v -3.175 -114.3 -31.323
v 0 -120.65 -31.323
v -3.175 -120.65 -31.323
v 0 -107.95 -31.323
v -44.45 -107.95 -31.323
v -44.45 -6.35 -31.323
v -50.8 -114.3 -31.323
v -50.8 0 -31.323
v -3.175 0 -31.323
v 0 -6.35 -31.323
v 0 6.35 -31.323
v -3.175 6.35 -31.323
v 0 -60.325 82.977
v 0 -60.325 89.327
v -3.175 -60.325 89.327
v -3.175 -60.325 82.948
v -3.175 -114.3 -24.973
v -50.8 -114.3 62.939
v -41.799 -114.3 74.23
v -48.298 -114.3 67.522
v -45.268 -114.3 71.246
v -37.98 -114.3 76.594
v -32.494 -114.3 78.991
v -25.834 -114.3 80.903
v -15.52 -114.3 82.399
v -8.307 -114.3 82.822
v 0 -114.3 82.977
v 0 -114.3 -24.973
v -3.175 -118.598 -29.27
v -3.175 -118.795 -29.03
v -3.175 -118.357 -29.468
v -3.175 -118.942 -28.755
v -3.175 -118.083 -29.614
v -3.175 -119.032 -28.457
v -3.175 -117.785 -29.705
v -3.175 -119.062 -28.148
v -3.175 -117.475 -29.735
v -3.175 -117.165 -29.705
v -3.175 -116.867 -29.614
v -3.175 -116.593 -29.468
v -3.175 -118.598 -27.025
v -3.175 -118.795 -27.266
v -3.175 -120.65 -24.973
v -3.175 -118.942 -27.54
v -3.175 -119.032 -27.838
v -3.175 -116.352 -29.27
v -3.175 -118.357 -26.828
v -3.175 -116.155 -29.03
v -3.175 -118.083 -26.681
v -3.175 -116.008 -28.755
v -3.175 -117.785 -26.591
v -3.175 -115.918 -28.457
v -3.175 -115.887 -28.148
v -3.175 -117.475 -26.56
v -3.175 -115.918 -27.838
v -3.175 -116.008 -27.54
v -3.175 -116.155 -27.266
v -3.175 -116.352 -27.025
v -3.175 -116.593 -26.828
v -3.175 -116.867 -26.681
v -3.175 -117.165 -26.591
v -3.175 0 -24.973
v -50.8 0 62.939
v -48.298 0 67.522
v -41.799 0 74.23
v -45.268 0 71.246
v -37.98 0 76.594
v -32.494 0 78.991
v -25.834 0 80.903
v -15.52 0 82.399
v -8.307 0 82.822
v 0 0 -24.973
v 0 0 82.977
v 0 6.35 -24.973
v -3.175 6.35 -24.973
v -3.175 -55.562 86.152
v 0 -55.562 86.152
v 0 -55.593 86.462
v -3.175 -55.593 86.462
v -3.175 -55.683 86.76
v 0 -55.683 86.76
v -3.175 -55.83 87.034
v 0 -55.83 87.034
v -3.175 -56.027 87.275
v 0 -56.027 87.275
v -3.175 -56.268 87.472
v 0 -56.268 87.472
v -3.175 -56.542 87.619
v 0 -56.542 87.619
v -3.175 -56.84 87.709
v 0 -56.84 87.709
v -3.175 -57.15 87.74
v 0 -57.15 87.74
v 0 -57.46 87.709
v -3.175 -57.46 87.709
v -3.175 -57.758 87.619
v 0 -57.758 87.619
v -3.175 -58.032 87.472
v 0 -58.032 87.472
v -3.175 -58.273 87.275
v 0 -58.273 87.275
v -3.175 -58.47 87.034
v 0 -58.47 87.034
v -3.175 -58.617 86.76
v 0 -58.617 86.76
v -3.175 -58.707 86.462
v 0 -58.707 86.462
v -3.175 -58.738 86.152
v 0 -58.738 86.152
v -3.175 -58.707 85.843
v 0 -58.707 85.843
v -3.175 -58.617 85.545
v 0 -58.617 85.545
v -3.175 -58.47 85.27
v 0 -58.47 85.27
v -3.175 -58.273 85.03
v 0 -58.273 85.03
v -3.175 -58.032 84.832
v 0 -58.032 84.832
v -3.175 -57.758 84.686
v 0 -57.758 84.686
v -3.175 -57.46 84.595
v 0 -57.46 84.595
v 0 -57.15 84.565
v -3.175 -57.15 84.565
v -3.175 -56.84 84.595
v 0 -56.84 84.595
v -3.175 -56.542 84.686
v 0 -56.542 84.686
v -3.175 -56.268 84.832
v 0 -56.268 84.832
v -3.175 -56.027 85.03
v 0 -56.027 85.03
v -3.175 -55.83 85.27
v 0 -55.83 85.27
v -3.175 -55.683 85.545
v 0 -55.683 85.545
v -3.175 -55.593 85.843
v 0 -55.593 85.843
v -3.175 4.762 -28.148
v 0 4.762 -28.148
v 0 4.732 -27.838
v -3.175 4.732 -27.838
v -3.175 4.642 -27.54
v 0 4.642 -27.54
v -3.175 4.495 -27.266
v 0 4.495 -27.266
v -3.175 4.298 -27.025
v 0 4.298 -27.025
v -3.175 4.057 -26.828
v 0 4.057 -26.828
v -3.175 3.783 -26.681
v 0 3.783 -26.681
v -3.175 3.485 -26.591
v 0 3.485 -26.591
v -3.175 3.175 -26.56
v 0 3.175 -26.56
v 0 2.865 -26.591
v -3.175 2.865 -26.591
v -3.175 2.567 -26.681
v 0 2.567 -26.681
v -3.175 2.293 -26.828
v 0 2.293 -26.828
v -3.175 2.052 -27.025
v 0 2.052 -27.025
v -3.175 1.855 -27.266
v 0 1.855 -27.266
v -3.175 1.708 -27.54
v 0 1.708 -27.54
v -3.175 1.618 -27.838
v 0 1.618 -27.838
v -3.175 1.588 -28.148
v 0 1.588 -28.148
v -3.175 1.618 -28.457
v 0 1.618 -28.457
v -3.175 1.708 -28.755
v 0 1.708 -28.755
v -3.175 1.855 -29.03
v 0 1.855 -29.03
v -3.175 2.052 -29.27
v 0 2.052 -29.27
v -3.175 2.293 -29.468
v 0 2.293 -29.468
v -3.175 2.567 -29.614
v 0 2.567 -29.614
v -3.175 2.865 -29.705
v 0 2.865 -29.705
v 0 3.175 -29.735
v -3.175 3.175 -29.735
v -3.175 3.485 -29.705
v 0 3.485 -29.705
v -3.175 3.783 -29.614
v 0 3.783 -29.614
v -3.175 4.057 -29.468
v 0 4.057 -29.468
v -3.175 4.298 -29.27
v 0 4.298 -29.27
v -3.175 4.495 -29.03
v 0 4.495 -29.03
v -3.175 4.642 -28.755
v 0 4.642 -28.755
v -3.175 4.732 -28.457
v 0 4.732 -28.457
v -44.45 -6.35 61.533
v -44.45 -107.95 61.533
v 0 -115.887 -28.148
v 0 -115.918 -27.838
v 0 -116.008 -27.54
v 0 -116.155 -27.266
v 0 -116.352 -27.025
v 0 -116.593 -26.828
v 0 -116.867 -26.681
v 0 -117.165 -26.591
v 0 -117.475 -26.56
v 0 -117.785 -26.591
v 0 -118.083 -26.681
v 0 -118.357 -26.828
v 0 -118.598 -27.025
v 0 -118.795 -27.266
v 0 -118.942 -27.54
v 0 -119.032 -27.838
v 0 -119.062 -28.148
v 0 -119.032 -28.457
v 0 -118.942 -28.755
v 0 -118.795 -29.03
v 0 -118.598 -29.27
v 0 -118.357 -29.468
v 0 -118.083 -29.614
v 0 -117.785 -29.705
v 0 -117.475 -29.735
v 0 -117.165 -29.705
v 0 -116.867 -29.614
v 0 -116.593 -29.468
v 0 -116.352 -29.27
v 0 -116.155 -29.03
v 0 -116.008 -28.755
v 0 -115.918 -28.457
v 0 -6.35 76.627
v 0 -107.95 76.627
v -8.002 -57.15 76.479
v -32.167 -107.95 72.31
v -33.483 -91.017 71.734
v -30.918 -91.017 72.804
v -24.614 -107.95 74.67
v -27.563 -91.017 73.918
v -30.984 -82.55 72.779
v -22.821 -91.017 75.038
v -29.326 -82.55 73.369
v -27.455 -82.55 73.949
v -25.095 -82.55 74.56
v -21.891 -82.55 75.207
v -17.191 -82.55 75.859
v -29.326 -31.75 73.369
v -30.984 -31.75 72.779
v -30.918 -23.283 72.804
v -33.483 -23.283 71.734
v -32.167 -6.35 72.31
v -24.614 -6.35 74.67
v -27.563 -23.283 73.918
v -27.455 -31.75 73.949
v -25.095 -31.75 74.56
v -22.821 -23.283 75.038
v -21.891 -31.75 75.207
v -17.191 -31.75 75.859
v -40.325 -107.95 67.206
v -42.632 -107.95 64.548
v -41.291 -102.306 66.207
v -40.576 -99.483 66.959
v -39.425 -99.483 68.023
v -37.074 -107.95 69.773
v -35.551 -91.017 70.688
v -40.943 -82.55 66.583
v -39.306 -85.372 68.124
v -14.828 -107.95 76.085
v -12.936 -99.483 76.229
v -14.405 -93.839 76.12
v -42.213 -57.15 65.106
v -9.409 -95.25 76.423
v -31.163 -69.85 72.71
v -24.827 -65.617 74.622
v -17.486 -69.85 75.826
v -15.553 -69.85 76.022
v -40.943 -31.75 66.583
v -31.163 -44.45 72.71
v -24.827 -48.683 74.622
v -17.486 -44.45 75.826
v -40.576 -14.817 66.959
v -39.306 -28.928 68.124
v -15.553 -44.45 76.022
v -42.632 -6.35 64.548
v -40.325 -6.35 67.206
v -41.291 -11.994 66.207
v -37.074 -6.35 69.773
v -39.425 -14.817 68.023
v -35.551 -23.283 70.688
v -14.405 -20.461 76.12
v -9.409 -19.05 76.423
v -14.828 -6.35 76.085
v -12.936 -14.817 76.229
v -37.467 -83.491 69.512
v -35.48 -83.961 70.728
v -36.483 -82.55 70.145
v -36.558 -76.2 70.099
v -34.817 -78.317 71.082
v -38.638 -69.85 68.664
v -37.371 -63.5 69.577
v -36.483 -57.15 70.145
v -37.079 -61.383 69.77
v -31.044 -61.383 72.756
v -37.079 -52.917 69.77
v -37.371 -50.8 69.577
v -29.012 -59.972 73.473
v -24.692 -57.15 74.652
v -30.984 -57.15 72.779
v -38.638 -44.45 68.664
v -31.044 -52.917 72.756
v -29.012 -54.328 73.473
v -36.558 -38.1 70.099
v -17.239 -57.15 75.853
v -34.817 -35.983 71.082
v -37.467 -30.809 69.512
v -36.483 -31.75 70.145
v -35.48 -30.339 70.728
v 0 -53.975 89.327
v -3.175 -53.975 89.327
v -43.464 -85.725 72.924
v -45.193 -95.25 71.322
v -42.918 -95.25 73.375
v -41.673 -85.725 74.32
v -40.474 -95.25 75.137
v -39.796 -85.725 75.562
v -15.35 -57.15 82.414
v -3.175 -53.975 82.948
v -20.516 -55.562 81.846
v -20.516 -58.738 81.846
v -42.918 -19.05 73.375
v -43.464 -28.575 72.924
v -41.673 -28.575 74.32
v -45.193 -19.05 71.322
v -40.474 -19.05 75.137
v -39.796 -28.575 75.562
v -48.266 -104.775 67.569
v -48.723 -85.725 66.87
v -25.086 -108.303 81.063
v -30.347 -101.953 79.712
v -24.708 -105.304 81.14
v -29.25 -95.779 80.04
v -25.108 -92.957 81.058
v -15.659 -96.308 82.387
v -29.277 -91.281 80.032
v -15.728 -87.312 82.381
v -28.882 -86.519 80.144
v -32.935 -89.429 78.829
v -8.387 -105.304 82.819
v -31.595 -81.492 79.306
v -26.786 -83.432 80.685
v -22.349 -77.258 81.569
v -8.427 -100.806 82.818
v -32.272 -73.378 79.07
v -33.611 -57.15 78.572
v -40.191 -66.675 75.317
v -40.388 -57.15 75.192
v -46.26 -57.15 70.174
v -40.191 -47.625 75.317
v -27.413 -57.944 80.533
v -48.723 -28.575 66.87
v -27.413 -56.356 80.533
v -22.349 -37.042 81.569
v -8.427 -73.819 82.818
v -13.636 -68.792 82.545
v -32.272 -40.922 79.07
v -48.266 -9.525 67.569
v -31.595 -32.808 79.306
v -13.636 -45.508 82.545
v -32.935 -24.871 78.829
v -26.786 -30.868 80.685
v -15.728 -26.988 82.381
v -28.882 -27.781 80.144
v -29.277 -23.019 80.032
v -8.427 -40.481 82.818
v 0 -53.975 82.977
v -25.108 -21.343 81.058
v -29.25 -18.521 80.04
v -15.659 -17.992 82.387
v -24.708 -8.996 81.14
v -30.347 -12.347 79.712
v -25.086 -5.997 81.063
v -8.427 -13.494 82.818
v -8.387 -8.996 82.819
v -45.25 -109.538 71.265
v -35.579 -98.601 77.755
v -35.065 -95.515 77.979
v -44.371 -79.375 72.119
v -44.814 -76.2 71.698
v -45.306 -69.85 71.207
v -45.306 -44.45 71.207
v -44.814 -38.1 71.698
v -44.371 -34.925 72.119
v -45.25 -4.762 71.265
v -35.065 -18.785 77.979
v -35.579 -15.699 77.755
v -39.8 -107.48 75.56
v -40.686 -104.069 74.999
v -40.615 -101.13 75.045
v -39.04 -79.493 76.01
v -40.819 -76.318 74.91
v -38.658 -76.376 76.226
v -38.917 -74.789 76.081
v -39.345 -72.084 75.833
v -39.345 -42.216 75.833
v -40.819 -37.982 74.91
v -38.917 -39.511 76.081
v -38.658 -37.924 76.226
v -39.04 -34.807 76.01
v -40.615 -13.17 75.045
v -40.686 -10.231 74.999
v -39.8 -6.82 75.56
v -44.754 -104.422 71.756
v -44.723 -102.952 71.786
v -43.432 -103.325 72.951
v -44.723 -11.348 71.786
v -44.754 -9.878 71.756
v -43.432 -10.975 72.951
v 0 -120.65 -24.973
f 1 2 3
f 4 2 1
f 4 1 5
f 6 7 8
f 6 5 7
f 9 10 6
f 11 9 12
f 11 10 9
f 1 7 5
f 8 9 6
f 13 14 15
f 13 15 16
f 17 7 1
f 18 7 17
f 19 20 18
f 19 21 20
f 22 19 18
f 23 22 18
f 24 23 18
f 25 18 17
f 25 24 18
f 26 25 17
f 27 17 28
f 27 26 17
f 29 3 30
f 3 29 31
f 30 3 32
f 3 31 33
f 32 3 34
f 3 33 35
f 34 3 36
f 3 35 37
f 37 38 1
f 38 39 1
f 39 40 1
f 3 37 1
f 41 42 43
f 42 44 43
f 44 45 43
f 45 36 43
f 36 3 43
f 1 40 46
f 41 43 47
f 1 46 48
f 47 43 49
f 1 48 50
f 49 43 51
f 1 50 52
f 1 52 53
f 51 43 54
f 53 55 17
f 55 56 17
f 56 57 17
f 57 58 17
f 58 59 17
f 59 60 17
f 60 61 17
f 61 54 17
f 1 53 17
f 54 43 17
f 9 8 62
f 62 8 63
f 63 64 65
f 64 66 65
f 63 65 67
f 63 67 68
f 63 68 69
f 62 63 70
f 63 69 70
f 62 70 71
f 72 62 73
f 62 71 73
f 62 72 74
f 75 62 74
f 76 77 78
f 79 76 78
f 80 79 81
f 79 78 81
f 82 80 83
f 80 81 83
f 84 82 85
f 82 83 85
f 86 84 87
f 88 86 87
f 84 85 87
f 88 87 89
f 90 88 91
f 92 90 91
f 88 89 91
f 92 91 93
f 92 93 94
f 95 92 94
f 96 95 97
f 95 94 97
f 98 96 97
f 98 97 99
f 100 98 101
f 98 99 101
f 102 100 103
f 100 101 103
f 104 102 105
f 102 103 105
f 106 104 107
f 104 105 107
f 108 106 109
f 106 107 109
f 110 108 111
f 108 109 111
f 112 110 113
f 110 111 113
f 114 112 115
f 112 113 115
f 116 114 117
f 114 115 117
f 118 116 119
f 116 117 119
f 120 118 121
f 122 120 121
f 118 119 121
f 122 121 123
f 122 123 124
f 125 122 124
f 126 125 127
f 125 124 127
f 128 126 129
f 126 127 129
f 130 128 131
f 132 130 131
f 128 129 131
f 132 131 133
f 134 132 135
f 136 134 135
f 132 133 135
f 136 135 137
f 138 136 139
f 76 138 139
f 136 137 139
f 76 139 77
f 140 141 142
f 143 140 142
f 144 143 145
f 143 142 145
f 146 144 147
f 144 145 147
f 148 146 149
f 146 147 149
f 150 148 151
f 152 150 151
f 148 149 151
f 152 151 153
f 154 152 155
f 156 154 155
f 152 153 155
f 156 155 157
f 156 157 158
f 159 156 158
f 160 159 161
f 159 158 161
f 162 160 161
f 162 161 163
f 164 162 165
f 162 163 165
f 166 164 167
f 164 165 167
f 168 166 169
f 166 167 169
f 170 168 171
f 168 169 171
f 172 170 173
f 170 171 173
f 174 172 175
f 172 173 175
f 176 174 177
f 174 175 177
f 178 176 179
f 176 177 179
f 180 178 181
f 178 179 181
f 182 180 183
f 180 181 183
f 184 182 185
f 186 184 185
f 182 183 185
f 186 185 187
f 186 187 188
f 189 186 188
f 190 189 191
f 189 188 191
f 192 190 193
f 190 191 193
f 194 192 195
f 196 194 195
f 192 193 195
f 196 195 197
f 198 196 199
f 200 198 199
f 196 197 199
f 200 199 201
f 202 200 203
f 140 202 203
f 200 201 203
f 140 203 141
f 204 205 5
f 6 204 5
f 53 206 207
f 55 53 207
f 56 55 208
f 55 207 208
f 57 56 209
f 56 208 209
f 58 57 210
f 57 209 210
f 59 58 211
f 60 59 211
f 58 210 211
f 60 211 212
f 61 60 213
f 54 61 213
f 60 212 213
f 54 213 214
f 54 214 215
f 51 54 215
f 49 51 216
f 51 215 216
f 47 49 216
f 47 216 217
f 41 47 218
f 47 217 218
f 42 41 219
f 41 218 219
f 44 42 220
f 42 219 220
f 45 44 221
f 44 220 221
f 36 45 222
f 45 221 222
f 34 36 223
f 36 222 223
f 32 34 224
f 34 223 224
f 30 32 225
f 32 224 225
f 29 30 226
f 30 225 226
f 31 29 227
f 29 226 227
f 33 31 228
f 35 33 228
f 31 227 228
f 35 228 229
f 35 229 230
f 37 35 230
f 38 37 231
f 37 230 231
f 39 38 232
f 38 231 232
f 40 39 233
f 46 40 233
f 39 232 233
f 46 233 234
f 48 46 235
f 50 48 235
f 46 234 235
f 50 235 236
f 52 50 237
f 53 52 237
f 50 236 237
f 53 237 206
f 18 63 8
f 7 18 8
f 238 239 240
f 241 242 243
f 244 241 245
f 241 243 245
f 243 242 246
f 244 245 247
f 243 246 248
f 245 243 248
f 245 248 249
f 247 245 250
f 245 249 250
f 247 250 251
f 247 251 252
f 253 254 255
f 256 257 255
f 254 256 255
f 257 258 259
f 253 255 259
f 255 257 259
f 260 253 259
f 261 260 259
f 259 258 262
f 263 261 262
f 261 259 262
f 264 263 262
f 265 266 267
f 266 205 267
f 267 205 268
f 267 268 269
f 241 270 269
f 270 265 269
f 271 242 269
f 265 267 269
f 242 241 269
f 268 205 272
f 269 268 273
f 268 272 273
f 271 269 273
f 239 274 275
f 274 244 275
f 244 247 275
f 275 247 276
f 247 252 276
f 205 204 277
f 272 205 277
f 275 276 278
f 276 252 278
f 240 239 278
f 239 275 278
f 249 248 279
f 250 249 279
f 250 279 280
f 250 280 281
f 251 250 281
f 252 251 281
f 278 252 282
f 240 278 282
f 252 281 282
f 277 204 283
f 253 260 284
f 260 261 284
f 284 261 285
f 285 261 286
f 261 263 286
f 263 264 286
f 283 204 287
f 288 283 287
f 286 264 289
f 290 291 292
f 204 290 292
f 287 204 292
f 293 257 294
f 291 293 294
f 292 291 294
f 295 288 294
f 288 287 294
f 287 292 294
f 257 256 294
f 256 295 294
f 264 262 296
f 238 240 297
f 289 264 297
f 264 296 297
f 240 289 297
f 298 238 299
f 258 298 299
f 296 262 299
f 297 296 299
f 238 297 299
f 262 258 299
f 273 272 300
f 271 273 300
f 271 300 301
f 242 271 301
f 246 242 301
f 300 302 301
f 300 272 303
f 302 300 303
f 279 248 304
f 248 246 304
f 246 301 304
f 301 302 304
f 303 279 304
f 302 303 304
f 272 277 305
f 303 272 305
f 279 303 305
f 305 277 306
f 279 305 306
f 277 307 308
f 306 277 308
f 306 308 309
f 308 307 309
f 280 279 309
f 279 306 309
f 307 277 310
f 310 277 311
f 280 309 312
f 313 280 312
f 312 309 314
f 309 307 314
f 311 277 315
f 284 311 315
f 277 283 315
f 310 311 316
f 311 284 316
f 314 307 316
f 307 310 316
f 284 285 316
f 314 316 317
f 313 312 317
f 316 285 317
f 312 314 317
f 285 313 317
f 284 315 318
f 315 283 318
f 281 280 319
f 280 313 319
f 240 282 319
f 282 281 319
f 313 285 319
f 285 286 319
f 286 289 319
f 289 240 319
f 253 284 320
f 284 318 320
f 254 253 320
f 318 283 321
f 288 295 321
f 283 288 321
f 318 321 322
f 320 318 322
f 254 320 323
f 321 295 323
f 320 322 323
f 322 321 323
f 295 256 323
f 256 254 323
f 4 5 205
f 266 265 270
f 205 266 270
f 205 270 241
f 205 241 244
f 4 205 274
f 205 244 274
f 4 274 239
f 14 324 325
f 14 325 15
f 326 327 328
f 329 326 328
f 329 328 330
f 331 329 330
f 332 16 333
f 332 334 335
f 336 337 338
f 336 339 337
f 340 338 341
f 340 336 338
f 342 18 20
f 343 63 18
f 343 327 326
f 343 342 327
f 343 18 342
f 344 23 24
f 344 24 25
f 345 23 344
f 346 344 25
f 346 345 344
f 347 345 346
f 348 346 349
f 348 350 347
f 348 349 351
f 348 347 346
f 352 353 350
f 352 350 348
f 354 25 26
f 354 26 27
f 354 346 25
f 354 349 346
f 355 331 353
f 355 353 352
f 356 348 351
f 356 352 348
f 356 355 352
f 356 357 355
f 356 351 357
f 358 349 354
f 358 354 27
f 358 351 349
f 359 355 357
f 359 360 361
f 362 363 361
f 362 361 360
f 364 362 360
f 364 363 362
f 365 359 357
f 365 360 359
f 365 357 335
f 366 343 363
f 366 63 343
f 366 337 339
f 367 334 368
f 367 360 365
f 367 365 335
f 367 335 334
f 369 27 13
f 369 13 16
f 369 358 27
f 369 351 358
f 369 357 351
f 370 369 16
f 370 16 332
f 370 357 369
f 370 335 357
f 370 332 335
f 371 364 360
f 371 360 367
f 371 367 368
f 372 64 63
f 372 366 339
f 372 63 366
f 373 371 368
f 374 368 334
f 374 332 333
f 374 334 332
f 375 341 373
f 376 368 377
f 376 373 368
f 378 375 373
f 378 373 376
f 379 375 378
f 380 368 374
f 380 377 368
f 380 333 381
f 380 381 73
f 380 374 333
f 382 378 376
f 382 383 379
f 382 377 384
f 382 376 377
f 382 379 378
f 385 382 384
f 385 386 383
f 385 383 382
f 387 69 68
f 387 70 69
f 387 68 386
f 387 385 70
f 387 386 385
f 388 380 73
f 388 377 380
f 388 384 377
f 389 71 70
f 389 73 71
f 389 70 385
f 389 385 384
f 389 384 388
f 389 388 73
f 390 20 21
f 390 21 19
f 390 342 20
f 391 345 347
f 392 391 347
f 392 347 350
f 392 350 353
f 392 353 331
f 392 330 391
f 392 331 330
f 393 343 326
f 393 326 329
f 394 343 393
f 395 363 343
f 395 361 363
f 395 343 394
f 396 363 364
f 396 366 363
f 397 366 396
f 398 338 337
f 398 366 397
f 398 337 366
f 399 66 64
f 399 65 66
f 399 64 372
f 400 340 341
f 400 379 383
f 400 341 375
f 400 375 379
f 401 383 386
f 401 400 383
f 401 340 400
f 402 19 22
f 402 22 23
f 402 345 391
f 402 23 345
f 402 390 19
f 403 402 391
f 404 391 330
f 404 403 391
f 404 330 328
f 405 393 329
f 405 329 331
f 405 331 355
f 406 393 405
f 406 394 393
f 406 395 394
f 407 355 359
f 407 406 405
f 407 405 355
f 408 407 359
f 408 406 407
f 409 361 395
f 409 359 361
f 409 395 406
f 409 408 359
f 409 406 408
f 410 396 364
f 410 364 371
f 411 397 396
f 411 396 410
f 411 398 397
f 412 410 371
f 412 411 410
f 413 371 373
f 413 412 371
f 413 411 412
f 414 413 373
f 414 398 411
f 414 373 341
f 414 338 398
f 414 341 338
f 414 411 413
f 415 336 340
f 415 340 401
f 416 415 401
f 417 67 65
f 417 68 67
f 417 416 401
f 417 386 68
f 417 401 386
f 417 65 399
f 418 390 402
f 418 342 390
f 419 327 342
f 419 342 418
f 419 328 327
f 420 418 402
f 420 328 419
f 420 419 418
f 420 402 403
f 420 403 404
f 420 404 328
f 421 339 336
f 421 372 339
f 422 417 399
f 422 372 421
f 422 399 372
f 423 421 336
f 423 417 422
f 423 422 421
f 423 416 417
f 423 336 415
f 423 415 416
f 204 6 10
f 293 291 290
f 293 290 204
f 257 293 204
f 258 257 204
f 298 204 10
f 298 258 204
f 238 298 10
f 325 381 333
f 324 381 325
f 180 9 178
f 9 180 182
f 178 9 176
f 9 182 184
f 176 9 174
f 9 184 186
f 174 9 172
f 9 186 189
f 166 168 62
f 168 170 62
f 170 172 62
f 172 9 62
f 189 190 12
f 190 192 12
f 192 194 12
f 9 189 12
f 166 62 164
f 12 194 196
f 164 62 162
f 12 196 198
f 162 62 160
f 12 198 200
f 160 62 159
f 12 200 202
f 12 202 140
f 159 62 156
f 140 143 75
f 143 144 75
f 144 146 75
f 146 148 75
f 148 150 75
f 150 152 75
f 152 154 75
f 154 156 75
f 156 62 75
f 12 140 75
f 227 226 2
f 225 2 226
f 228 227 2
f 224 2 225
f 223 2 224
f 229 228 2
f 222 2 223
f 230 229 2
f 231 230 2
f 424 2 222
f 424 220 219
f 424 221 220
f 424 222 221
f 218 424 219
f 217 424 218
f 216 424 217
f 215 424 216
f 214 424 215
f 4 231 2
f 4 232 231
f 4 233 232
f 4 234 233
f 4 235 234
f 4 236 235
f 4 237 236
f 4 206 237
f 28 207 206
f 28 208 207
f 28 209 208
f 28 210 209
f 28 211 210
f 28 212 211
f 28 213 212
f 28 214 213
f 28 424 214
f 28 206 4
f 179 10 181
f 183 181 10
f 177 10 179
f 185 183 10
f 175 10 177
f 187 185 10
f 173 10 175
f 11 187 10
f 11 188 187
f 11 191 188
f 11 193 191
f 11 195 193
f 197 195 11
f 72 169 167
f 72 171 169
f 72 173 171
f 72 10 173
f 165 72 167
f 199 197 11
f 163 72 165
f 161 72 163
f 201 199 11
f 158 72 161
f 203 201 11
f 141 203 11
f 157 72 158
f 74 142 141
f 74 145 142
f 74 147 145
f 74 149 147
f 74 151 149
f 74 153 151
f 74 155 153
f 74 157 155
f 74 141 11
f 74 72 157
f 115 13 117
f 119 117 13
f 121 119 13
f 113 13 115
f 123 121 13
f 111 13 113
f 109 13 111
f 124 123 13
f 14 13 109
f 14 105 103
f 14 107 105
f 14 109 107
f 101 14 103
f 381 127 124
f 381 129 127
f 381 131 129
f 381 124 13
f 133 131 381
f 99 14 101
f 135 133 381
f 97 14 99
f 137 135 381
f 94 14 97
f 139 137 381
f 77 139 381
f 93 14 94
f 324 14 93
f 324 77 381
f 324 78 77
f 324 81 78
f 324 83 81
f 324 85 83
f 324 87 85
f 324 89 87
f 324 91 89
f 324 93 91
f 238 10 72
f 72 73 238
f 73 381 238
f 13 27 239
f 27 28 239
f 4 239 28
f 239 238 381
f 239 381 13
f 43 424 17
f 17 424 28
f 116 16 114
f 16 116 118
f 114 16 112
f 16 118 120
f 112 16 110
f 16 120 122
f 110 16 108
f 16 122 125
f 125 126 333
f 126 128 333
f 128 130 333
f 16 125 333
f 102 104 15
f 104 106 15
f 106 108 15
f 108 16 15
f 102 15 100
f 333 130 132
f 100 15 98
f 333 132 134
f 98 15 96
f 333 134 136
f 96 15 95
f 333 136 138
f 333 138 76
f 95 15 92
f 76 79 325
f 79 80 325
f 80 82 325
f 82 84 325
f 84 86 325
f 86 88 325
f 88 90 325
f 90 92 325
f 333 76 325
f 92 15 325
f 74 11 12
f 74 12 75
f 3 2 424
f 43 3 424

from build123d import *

# Parameters (mm, degrees)
F1_DEPTH = 114.3
F2_T     = -6.35
F3_W     = 6.35
F3_H     = 6.35
F3_R     = 1.5875
F4_DEPTH = 3.175


with BuildPart() as f1:
    # F0 (on Front) → F1 (new body)
    with BuildSketch(Plane.XZ):
        with BuildLine():
            Line((0, -31.3225934026), (0, 82.9774065974))
            add(Edge.make_bspline(
                [(-50.8, 62.9390975716), (-47.0688648848, 71.4759068336), (-33.0013413264, 81.0637344093), (-15.4475548971, 82.9055417219), (0, 82.9774065974)],
                knots=[0, 0, 0, 0, 0.4529279664, 1, 1, 1, 1], degree=3))
            Line((-50.8, 62.9390975716), (-50.8, -31.3225934026))
            Line((-50.8, -31.3225934026), (0, -31.3225934026))
        make_face()
    extrude(amount=F1_DEPTH)

    # F2
    f2_openings = [f1.faces().sort_by_distance(p)[0] for p in [
        (0, -57.15, 25.827407),
        (-25.4, -57.15, -31.322593),
    ]]
    offset(amount=F2_T, openings=f2_openings, kind=Kind.INTERSECTION)

    # F3 (on Right) → F4 (join)
    with BuildSketch(Plane.YZ):
        with Locations((3.175, -28.1475934026)):
            Rectangle(F3_W, F3_H)
        with Locations((3.175, -28.1475934026)):
            Circle(F3_R, mode=Mode.SUBTRACT)
        with Locations((-117.475, -28.1475934026)):
            Rectangle(F3_W, F3_H)
        with Locations((-117.475, -28.1475934026)):
            Circle(F3_R, mode=Mode.SUBTRACT)
        Polygon((-53.975, 89.3274065974), (-60.325, 89.3274065974), (-60.325, 82.9774065974), (-60.325, 81.7074065974), (-53.975, 81.7074065974), (-53.975, 82.9774065974), align=None)
        with Locations((-57.15, 86.1524065974)):
            Circle(F3_R, mode=Mode.SUBTRACT)
    extrude(amount=-F4_DEPTH)


solid = f1.part
